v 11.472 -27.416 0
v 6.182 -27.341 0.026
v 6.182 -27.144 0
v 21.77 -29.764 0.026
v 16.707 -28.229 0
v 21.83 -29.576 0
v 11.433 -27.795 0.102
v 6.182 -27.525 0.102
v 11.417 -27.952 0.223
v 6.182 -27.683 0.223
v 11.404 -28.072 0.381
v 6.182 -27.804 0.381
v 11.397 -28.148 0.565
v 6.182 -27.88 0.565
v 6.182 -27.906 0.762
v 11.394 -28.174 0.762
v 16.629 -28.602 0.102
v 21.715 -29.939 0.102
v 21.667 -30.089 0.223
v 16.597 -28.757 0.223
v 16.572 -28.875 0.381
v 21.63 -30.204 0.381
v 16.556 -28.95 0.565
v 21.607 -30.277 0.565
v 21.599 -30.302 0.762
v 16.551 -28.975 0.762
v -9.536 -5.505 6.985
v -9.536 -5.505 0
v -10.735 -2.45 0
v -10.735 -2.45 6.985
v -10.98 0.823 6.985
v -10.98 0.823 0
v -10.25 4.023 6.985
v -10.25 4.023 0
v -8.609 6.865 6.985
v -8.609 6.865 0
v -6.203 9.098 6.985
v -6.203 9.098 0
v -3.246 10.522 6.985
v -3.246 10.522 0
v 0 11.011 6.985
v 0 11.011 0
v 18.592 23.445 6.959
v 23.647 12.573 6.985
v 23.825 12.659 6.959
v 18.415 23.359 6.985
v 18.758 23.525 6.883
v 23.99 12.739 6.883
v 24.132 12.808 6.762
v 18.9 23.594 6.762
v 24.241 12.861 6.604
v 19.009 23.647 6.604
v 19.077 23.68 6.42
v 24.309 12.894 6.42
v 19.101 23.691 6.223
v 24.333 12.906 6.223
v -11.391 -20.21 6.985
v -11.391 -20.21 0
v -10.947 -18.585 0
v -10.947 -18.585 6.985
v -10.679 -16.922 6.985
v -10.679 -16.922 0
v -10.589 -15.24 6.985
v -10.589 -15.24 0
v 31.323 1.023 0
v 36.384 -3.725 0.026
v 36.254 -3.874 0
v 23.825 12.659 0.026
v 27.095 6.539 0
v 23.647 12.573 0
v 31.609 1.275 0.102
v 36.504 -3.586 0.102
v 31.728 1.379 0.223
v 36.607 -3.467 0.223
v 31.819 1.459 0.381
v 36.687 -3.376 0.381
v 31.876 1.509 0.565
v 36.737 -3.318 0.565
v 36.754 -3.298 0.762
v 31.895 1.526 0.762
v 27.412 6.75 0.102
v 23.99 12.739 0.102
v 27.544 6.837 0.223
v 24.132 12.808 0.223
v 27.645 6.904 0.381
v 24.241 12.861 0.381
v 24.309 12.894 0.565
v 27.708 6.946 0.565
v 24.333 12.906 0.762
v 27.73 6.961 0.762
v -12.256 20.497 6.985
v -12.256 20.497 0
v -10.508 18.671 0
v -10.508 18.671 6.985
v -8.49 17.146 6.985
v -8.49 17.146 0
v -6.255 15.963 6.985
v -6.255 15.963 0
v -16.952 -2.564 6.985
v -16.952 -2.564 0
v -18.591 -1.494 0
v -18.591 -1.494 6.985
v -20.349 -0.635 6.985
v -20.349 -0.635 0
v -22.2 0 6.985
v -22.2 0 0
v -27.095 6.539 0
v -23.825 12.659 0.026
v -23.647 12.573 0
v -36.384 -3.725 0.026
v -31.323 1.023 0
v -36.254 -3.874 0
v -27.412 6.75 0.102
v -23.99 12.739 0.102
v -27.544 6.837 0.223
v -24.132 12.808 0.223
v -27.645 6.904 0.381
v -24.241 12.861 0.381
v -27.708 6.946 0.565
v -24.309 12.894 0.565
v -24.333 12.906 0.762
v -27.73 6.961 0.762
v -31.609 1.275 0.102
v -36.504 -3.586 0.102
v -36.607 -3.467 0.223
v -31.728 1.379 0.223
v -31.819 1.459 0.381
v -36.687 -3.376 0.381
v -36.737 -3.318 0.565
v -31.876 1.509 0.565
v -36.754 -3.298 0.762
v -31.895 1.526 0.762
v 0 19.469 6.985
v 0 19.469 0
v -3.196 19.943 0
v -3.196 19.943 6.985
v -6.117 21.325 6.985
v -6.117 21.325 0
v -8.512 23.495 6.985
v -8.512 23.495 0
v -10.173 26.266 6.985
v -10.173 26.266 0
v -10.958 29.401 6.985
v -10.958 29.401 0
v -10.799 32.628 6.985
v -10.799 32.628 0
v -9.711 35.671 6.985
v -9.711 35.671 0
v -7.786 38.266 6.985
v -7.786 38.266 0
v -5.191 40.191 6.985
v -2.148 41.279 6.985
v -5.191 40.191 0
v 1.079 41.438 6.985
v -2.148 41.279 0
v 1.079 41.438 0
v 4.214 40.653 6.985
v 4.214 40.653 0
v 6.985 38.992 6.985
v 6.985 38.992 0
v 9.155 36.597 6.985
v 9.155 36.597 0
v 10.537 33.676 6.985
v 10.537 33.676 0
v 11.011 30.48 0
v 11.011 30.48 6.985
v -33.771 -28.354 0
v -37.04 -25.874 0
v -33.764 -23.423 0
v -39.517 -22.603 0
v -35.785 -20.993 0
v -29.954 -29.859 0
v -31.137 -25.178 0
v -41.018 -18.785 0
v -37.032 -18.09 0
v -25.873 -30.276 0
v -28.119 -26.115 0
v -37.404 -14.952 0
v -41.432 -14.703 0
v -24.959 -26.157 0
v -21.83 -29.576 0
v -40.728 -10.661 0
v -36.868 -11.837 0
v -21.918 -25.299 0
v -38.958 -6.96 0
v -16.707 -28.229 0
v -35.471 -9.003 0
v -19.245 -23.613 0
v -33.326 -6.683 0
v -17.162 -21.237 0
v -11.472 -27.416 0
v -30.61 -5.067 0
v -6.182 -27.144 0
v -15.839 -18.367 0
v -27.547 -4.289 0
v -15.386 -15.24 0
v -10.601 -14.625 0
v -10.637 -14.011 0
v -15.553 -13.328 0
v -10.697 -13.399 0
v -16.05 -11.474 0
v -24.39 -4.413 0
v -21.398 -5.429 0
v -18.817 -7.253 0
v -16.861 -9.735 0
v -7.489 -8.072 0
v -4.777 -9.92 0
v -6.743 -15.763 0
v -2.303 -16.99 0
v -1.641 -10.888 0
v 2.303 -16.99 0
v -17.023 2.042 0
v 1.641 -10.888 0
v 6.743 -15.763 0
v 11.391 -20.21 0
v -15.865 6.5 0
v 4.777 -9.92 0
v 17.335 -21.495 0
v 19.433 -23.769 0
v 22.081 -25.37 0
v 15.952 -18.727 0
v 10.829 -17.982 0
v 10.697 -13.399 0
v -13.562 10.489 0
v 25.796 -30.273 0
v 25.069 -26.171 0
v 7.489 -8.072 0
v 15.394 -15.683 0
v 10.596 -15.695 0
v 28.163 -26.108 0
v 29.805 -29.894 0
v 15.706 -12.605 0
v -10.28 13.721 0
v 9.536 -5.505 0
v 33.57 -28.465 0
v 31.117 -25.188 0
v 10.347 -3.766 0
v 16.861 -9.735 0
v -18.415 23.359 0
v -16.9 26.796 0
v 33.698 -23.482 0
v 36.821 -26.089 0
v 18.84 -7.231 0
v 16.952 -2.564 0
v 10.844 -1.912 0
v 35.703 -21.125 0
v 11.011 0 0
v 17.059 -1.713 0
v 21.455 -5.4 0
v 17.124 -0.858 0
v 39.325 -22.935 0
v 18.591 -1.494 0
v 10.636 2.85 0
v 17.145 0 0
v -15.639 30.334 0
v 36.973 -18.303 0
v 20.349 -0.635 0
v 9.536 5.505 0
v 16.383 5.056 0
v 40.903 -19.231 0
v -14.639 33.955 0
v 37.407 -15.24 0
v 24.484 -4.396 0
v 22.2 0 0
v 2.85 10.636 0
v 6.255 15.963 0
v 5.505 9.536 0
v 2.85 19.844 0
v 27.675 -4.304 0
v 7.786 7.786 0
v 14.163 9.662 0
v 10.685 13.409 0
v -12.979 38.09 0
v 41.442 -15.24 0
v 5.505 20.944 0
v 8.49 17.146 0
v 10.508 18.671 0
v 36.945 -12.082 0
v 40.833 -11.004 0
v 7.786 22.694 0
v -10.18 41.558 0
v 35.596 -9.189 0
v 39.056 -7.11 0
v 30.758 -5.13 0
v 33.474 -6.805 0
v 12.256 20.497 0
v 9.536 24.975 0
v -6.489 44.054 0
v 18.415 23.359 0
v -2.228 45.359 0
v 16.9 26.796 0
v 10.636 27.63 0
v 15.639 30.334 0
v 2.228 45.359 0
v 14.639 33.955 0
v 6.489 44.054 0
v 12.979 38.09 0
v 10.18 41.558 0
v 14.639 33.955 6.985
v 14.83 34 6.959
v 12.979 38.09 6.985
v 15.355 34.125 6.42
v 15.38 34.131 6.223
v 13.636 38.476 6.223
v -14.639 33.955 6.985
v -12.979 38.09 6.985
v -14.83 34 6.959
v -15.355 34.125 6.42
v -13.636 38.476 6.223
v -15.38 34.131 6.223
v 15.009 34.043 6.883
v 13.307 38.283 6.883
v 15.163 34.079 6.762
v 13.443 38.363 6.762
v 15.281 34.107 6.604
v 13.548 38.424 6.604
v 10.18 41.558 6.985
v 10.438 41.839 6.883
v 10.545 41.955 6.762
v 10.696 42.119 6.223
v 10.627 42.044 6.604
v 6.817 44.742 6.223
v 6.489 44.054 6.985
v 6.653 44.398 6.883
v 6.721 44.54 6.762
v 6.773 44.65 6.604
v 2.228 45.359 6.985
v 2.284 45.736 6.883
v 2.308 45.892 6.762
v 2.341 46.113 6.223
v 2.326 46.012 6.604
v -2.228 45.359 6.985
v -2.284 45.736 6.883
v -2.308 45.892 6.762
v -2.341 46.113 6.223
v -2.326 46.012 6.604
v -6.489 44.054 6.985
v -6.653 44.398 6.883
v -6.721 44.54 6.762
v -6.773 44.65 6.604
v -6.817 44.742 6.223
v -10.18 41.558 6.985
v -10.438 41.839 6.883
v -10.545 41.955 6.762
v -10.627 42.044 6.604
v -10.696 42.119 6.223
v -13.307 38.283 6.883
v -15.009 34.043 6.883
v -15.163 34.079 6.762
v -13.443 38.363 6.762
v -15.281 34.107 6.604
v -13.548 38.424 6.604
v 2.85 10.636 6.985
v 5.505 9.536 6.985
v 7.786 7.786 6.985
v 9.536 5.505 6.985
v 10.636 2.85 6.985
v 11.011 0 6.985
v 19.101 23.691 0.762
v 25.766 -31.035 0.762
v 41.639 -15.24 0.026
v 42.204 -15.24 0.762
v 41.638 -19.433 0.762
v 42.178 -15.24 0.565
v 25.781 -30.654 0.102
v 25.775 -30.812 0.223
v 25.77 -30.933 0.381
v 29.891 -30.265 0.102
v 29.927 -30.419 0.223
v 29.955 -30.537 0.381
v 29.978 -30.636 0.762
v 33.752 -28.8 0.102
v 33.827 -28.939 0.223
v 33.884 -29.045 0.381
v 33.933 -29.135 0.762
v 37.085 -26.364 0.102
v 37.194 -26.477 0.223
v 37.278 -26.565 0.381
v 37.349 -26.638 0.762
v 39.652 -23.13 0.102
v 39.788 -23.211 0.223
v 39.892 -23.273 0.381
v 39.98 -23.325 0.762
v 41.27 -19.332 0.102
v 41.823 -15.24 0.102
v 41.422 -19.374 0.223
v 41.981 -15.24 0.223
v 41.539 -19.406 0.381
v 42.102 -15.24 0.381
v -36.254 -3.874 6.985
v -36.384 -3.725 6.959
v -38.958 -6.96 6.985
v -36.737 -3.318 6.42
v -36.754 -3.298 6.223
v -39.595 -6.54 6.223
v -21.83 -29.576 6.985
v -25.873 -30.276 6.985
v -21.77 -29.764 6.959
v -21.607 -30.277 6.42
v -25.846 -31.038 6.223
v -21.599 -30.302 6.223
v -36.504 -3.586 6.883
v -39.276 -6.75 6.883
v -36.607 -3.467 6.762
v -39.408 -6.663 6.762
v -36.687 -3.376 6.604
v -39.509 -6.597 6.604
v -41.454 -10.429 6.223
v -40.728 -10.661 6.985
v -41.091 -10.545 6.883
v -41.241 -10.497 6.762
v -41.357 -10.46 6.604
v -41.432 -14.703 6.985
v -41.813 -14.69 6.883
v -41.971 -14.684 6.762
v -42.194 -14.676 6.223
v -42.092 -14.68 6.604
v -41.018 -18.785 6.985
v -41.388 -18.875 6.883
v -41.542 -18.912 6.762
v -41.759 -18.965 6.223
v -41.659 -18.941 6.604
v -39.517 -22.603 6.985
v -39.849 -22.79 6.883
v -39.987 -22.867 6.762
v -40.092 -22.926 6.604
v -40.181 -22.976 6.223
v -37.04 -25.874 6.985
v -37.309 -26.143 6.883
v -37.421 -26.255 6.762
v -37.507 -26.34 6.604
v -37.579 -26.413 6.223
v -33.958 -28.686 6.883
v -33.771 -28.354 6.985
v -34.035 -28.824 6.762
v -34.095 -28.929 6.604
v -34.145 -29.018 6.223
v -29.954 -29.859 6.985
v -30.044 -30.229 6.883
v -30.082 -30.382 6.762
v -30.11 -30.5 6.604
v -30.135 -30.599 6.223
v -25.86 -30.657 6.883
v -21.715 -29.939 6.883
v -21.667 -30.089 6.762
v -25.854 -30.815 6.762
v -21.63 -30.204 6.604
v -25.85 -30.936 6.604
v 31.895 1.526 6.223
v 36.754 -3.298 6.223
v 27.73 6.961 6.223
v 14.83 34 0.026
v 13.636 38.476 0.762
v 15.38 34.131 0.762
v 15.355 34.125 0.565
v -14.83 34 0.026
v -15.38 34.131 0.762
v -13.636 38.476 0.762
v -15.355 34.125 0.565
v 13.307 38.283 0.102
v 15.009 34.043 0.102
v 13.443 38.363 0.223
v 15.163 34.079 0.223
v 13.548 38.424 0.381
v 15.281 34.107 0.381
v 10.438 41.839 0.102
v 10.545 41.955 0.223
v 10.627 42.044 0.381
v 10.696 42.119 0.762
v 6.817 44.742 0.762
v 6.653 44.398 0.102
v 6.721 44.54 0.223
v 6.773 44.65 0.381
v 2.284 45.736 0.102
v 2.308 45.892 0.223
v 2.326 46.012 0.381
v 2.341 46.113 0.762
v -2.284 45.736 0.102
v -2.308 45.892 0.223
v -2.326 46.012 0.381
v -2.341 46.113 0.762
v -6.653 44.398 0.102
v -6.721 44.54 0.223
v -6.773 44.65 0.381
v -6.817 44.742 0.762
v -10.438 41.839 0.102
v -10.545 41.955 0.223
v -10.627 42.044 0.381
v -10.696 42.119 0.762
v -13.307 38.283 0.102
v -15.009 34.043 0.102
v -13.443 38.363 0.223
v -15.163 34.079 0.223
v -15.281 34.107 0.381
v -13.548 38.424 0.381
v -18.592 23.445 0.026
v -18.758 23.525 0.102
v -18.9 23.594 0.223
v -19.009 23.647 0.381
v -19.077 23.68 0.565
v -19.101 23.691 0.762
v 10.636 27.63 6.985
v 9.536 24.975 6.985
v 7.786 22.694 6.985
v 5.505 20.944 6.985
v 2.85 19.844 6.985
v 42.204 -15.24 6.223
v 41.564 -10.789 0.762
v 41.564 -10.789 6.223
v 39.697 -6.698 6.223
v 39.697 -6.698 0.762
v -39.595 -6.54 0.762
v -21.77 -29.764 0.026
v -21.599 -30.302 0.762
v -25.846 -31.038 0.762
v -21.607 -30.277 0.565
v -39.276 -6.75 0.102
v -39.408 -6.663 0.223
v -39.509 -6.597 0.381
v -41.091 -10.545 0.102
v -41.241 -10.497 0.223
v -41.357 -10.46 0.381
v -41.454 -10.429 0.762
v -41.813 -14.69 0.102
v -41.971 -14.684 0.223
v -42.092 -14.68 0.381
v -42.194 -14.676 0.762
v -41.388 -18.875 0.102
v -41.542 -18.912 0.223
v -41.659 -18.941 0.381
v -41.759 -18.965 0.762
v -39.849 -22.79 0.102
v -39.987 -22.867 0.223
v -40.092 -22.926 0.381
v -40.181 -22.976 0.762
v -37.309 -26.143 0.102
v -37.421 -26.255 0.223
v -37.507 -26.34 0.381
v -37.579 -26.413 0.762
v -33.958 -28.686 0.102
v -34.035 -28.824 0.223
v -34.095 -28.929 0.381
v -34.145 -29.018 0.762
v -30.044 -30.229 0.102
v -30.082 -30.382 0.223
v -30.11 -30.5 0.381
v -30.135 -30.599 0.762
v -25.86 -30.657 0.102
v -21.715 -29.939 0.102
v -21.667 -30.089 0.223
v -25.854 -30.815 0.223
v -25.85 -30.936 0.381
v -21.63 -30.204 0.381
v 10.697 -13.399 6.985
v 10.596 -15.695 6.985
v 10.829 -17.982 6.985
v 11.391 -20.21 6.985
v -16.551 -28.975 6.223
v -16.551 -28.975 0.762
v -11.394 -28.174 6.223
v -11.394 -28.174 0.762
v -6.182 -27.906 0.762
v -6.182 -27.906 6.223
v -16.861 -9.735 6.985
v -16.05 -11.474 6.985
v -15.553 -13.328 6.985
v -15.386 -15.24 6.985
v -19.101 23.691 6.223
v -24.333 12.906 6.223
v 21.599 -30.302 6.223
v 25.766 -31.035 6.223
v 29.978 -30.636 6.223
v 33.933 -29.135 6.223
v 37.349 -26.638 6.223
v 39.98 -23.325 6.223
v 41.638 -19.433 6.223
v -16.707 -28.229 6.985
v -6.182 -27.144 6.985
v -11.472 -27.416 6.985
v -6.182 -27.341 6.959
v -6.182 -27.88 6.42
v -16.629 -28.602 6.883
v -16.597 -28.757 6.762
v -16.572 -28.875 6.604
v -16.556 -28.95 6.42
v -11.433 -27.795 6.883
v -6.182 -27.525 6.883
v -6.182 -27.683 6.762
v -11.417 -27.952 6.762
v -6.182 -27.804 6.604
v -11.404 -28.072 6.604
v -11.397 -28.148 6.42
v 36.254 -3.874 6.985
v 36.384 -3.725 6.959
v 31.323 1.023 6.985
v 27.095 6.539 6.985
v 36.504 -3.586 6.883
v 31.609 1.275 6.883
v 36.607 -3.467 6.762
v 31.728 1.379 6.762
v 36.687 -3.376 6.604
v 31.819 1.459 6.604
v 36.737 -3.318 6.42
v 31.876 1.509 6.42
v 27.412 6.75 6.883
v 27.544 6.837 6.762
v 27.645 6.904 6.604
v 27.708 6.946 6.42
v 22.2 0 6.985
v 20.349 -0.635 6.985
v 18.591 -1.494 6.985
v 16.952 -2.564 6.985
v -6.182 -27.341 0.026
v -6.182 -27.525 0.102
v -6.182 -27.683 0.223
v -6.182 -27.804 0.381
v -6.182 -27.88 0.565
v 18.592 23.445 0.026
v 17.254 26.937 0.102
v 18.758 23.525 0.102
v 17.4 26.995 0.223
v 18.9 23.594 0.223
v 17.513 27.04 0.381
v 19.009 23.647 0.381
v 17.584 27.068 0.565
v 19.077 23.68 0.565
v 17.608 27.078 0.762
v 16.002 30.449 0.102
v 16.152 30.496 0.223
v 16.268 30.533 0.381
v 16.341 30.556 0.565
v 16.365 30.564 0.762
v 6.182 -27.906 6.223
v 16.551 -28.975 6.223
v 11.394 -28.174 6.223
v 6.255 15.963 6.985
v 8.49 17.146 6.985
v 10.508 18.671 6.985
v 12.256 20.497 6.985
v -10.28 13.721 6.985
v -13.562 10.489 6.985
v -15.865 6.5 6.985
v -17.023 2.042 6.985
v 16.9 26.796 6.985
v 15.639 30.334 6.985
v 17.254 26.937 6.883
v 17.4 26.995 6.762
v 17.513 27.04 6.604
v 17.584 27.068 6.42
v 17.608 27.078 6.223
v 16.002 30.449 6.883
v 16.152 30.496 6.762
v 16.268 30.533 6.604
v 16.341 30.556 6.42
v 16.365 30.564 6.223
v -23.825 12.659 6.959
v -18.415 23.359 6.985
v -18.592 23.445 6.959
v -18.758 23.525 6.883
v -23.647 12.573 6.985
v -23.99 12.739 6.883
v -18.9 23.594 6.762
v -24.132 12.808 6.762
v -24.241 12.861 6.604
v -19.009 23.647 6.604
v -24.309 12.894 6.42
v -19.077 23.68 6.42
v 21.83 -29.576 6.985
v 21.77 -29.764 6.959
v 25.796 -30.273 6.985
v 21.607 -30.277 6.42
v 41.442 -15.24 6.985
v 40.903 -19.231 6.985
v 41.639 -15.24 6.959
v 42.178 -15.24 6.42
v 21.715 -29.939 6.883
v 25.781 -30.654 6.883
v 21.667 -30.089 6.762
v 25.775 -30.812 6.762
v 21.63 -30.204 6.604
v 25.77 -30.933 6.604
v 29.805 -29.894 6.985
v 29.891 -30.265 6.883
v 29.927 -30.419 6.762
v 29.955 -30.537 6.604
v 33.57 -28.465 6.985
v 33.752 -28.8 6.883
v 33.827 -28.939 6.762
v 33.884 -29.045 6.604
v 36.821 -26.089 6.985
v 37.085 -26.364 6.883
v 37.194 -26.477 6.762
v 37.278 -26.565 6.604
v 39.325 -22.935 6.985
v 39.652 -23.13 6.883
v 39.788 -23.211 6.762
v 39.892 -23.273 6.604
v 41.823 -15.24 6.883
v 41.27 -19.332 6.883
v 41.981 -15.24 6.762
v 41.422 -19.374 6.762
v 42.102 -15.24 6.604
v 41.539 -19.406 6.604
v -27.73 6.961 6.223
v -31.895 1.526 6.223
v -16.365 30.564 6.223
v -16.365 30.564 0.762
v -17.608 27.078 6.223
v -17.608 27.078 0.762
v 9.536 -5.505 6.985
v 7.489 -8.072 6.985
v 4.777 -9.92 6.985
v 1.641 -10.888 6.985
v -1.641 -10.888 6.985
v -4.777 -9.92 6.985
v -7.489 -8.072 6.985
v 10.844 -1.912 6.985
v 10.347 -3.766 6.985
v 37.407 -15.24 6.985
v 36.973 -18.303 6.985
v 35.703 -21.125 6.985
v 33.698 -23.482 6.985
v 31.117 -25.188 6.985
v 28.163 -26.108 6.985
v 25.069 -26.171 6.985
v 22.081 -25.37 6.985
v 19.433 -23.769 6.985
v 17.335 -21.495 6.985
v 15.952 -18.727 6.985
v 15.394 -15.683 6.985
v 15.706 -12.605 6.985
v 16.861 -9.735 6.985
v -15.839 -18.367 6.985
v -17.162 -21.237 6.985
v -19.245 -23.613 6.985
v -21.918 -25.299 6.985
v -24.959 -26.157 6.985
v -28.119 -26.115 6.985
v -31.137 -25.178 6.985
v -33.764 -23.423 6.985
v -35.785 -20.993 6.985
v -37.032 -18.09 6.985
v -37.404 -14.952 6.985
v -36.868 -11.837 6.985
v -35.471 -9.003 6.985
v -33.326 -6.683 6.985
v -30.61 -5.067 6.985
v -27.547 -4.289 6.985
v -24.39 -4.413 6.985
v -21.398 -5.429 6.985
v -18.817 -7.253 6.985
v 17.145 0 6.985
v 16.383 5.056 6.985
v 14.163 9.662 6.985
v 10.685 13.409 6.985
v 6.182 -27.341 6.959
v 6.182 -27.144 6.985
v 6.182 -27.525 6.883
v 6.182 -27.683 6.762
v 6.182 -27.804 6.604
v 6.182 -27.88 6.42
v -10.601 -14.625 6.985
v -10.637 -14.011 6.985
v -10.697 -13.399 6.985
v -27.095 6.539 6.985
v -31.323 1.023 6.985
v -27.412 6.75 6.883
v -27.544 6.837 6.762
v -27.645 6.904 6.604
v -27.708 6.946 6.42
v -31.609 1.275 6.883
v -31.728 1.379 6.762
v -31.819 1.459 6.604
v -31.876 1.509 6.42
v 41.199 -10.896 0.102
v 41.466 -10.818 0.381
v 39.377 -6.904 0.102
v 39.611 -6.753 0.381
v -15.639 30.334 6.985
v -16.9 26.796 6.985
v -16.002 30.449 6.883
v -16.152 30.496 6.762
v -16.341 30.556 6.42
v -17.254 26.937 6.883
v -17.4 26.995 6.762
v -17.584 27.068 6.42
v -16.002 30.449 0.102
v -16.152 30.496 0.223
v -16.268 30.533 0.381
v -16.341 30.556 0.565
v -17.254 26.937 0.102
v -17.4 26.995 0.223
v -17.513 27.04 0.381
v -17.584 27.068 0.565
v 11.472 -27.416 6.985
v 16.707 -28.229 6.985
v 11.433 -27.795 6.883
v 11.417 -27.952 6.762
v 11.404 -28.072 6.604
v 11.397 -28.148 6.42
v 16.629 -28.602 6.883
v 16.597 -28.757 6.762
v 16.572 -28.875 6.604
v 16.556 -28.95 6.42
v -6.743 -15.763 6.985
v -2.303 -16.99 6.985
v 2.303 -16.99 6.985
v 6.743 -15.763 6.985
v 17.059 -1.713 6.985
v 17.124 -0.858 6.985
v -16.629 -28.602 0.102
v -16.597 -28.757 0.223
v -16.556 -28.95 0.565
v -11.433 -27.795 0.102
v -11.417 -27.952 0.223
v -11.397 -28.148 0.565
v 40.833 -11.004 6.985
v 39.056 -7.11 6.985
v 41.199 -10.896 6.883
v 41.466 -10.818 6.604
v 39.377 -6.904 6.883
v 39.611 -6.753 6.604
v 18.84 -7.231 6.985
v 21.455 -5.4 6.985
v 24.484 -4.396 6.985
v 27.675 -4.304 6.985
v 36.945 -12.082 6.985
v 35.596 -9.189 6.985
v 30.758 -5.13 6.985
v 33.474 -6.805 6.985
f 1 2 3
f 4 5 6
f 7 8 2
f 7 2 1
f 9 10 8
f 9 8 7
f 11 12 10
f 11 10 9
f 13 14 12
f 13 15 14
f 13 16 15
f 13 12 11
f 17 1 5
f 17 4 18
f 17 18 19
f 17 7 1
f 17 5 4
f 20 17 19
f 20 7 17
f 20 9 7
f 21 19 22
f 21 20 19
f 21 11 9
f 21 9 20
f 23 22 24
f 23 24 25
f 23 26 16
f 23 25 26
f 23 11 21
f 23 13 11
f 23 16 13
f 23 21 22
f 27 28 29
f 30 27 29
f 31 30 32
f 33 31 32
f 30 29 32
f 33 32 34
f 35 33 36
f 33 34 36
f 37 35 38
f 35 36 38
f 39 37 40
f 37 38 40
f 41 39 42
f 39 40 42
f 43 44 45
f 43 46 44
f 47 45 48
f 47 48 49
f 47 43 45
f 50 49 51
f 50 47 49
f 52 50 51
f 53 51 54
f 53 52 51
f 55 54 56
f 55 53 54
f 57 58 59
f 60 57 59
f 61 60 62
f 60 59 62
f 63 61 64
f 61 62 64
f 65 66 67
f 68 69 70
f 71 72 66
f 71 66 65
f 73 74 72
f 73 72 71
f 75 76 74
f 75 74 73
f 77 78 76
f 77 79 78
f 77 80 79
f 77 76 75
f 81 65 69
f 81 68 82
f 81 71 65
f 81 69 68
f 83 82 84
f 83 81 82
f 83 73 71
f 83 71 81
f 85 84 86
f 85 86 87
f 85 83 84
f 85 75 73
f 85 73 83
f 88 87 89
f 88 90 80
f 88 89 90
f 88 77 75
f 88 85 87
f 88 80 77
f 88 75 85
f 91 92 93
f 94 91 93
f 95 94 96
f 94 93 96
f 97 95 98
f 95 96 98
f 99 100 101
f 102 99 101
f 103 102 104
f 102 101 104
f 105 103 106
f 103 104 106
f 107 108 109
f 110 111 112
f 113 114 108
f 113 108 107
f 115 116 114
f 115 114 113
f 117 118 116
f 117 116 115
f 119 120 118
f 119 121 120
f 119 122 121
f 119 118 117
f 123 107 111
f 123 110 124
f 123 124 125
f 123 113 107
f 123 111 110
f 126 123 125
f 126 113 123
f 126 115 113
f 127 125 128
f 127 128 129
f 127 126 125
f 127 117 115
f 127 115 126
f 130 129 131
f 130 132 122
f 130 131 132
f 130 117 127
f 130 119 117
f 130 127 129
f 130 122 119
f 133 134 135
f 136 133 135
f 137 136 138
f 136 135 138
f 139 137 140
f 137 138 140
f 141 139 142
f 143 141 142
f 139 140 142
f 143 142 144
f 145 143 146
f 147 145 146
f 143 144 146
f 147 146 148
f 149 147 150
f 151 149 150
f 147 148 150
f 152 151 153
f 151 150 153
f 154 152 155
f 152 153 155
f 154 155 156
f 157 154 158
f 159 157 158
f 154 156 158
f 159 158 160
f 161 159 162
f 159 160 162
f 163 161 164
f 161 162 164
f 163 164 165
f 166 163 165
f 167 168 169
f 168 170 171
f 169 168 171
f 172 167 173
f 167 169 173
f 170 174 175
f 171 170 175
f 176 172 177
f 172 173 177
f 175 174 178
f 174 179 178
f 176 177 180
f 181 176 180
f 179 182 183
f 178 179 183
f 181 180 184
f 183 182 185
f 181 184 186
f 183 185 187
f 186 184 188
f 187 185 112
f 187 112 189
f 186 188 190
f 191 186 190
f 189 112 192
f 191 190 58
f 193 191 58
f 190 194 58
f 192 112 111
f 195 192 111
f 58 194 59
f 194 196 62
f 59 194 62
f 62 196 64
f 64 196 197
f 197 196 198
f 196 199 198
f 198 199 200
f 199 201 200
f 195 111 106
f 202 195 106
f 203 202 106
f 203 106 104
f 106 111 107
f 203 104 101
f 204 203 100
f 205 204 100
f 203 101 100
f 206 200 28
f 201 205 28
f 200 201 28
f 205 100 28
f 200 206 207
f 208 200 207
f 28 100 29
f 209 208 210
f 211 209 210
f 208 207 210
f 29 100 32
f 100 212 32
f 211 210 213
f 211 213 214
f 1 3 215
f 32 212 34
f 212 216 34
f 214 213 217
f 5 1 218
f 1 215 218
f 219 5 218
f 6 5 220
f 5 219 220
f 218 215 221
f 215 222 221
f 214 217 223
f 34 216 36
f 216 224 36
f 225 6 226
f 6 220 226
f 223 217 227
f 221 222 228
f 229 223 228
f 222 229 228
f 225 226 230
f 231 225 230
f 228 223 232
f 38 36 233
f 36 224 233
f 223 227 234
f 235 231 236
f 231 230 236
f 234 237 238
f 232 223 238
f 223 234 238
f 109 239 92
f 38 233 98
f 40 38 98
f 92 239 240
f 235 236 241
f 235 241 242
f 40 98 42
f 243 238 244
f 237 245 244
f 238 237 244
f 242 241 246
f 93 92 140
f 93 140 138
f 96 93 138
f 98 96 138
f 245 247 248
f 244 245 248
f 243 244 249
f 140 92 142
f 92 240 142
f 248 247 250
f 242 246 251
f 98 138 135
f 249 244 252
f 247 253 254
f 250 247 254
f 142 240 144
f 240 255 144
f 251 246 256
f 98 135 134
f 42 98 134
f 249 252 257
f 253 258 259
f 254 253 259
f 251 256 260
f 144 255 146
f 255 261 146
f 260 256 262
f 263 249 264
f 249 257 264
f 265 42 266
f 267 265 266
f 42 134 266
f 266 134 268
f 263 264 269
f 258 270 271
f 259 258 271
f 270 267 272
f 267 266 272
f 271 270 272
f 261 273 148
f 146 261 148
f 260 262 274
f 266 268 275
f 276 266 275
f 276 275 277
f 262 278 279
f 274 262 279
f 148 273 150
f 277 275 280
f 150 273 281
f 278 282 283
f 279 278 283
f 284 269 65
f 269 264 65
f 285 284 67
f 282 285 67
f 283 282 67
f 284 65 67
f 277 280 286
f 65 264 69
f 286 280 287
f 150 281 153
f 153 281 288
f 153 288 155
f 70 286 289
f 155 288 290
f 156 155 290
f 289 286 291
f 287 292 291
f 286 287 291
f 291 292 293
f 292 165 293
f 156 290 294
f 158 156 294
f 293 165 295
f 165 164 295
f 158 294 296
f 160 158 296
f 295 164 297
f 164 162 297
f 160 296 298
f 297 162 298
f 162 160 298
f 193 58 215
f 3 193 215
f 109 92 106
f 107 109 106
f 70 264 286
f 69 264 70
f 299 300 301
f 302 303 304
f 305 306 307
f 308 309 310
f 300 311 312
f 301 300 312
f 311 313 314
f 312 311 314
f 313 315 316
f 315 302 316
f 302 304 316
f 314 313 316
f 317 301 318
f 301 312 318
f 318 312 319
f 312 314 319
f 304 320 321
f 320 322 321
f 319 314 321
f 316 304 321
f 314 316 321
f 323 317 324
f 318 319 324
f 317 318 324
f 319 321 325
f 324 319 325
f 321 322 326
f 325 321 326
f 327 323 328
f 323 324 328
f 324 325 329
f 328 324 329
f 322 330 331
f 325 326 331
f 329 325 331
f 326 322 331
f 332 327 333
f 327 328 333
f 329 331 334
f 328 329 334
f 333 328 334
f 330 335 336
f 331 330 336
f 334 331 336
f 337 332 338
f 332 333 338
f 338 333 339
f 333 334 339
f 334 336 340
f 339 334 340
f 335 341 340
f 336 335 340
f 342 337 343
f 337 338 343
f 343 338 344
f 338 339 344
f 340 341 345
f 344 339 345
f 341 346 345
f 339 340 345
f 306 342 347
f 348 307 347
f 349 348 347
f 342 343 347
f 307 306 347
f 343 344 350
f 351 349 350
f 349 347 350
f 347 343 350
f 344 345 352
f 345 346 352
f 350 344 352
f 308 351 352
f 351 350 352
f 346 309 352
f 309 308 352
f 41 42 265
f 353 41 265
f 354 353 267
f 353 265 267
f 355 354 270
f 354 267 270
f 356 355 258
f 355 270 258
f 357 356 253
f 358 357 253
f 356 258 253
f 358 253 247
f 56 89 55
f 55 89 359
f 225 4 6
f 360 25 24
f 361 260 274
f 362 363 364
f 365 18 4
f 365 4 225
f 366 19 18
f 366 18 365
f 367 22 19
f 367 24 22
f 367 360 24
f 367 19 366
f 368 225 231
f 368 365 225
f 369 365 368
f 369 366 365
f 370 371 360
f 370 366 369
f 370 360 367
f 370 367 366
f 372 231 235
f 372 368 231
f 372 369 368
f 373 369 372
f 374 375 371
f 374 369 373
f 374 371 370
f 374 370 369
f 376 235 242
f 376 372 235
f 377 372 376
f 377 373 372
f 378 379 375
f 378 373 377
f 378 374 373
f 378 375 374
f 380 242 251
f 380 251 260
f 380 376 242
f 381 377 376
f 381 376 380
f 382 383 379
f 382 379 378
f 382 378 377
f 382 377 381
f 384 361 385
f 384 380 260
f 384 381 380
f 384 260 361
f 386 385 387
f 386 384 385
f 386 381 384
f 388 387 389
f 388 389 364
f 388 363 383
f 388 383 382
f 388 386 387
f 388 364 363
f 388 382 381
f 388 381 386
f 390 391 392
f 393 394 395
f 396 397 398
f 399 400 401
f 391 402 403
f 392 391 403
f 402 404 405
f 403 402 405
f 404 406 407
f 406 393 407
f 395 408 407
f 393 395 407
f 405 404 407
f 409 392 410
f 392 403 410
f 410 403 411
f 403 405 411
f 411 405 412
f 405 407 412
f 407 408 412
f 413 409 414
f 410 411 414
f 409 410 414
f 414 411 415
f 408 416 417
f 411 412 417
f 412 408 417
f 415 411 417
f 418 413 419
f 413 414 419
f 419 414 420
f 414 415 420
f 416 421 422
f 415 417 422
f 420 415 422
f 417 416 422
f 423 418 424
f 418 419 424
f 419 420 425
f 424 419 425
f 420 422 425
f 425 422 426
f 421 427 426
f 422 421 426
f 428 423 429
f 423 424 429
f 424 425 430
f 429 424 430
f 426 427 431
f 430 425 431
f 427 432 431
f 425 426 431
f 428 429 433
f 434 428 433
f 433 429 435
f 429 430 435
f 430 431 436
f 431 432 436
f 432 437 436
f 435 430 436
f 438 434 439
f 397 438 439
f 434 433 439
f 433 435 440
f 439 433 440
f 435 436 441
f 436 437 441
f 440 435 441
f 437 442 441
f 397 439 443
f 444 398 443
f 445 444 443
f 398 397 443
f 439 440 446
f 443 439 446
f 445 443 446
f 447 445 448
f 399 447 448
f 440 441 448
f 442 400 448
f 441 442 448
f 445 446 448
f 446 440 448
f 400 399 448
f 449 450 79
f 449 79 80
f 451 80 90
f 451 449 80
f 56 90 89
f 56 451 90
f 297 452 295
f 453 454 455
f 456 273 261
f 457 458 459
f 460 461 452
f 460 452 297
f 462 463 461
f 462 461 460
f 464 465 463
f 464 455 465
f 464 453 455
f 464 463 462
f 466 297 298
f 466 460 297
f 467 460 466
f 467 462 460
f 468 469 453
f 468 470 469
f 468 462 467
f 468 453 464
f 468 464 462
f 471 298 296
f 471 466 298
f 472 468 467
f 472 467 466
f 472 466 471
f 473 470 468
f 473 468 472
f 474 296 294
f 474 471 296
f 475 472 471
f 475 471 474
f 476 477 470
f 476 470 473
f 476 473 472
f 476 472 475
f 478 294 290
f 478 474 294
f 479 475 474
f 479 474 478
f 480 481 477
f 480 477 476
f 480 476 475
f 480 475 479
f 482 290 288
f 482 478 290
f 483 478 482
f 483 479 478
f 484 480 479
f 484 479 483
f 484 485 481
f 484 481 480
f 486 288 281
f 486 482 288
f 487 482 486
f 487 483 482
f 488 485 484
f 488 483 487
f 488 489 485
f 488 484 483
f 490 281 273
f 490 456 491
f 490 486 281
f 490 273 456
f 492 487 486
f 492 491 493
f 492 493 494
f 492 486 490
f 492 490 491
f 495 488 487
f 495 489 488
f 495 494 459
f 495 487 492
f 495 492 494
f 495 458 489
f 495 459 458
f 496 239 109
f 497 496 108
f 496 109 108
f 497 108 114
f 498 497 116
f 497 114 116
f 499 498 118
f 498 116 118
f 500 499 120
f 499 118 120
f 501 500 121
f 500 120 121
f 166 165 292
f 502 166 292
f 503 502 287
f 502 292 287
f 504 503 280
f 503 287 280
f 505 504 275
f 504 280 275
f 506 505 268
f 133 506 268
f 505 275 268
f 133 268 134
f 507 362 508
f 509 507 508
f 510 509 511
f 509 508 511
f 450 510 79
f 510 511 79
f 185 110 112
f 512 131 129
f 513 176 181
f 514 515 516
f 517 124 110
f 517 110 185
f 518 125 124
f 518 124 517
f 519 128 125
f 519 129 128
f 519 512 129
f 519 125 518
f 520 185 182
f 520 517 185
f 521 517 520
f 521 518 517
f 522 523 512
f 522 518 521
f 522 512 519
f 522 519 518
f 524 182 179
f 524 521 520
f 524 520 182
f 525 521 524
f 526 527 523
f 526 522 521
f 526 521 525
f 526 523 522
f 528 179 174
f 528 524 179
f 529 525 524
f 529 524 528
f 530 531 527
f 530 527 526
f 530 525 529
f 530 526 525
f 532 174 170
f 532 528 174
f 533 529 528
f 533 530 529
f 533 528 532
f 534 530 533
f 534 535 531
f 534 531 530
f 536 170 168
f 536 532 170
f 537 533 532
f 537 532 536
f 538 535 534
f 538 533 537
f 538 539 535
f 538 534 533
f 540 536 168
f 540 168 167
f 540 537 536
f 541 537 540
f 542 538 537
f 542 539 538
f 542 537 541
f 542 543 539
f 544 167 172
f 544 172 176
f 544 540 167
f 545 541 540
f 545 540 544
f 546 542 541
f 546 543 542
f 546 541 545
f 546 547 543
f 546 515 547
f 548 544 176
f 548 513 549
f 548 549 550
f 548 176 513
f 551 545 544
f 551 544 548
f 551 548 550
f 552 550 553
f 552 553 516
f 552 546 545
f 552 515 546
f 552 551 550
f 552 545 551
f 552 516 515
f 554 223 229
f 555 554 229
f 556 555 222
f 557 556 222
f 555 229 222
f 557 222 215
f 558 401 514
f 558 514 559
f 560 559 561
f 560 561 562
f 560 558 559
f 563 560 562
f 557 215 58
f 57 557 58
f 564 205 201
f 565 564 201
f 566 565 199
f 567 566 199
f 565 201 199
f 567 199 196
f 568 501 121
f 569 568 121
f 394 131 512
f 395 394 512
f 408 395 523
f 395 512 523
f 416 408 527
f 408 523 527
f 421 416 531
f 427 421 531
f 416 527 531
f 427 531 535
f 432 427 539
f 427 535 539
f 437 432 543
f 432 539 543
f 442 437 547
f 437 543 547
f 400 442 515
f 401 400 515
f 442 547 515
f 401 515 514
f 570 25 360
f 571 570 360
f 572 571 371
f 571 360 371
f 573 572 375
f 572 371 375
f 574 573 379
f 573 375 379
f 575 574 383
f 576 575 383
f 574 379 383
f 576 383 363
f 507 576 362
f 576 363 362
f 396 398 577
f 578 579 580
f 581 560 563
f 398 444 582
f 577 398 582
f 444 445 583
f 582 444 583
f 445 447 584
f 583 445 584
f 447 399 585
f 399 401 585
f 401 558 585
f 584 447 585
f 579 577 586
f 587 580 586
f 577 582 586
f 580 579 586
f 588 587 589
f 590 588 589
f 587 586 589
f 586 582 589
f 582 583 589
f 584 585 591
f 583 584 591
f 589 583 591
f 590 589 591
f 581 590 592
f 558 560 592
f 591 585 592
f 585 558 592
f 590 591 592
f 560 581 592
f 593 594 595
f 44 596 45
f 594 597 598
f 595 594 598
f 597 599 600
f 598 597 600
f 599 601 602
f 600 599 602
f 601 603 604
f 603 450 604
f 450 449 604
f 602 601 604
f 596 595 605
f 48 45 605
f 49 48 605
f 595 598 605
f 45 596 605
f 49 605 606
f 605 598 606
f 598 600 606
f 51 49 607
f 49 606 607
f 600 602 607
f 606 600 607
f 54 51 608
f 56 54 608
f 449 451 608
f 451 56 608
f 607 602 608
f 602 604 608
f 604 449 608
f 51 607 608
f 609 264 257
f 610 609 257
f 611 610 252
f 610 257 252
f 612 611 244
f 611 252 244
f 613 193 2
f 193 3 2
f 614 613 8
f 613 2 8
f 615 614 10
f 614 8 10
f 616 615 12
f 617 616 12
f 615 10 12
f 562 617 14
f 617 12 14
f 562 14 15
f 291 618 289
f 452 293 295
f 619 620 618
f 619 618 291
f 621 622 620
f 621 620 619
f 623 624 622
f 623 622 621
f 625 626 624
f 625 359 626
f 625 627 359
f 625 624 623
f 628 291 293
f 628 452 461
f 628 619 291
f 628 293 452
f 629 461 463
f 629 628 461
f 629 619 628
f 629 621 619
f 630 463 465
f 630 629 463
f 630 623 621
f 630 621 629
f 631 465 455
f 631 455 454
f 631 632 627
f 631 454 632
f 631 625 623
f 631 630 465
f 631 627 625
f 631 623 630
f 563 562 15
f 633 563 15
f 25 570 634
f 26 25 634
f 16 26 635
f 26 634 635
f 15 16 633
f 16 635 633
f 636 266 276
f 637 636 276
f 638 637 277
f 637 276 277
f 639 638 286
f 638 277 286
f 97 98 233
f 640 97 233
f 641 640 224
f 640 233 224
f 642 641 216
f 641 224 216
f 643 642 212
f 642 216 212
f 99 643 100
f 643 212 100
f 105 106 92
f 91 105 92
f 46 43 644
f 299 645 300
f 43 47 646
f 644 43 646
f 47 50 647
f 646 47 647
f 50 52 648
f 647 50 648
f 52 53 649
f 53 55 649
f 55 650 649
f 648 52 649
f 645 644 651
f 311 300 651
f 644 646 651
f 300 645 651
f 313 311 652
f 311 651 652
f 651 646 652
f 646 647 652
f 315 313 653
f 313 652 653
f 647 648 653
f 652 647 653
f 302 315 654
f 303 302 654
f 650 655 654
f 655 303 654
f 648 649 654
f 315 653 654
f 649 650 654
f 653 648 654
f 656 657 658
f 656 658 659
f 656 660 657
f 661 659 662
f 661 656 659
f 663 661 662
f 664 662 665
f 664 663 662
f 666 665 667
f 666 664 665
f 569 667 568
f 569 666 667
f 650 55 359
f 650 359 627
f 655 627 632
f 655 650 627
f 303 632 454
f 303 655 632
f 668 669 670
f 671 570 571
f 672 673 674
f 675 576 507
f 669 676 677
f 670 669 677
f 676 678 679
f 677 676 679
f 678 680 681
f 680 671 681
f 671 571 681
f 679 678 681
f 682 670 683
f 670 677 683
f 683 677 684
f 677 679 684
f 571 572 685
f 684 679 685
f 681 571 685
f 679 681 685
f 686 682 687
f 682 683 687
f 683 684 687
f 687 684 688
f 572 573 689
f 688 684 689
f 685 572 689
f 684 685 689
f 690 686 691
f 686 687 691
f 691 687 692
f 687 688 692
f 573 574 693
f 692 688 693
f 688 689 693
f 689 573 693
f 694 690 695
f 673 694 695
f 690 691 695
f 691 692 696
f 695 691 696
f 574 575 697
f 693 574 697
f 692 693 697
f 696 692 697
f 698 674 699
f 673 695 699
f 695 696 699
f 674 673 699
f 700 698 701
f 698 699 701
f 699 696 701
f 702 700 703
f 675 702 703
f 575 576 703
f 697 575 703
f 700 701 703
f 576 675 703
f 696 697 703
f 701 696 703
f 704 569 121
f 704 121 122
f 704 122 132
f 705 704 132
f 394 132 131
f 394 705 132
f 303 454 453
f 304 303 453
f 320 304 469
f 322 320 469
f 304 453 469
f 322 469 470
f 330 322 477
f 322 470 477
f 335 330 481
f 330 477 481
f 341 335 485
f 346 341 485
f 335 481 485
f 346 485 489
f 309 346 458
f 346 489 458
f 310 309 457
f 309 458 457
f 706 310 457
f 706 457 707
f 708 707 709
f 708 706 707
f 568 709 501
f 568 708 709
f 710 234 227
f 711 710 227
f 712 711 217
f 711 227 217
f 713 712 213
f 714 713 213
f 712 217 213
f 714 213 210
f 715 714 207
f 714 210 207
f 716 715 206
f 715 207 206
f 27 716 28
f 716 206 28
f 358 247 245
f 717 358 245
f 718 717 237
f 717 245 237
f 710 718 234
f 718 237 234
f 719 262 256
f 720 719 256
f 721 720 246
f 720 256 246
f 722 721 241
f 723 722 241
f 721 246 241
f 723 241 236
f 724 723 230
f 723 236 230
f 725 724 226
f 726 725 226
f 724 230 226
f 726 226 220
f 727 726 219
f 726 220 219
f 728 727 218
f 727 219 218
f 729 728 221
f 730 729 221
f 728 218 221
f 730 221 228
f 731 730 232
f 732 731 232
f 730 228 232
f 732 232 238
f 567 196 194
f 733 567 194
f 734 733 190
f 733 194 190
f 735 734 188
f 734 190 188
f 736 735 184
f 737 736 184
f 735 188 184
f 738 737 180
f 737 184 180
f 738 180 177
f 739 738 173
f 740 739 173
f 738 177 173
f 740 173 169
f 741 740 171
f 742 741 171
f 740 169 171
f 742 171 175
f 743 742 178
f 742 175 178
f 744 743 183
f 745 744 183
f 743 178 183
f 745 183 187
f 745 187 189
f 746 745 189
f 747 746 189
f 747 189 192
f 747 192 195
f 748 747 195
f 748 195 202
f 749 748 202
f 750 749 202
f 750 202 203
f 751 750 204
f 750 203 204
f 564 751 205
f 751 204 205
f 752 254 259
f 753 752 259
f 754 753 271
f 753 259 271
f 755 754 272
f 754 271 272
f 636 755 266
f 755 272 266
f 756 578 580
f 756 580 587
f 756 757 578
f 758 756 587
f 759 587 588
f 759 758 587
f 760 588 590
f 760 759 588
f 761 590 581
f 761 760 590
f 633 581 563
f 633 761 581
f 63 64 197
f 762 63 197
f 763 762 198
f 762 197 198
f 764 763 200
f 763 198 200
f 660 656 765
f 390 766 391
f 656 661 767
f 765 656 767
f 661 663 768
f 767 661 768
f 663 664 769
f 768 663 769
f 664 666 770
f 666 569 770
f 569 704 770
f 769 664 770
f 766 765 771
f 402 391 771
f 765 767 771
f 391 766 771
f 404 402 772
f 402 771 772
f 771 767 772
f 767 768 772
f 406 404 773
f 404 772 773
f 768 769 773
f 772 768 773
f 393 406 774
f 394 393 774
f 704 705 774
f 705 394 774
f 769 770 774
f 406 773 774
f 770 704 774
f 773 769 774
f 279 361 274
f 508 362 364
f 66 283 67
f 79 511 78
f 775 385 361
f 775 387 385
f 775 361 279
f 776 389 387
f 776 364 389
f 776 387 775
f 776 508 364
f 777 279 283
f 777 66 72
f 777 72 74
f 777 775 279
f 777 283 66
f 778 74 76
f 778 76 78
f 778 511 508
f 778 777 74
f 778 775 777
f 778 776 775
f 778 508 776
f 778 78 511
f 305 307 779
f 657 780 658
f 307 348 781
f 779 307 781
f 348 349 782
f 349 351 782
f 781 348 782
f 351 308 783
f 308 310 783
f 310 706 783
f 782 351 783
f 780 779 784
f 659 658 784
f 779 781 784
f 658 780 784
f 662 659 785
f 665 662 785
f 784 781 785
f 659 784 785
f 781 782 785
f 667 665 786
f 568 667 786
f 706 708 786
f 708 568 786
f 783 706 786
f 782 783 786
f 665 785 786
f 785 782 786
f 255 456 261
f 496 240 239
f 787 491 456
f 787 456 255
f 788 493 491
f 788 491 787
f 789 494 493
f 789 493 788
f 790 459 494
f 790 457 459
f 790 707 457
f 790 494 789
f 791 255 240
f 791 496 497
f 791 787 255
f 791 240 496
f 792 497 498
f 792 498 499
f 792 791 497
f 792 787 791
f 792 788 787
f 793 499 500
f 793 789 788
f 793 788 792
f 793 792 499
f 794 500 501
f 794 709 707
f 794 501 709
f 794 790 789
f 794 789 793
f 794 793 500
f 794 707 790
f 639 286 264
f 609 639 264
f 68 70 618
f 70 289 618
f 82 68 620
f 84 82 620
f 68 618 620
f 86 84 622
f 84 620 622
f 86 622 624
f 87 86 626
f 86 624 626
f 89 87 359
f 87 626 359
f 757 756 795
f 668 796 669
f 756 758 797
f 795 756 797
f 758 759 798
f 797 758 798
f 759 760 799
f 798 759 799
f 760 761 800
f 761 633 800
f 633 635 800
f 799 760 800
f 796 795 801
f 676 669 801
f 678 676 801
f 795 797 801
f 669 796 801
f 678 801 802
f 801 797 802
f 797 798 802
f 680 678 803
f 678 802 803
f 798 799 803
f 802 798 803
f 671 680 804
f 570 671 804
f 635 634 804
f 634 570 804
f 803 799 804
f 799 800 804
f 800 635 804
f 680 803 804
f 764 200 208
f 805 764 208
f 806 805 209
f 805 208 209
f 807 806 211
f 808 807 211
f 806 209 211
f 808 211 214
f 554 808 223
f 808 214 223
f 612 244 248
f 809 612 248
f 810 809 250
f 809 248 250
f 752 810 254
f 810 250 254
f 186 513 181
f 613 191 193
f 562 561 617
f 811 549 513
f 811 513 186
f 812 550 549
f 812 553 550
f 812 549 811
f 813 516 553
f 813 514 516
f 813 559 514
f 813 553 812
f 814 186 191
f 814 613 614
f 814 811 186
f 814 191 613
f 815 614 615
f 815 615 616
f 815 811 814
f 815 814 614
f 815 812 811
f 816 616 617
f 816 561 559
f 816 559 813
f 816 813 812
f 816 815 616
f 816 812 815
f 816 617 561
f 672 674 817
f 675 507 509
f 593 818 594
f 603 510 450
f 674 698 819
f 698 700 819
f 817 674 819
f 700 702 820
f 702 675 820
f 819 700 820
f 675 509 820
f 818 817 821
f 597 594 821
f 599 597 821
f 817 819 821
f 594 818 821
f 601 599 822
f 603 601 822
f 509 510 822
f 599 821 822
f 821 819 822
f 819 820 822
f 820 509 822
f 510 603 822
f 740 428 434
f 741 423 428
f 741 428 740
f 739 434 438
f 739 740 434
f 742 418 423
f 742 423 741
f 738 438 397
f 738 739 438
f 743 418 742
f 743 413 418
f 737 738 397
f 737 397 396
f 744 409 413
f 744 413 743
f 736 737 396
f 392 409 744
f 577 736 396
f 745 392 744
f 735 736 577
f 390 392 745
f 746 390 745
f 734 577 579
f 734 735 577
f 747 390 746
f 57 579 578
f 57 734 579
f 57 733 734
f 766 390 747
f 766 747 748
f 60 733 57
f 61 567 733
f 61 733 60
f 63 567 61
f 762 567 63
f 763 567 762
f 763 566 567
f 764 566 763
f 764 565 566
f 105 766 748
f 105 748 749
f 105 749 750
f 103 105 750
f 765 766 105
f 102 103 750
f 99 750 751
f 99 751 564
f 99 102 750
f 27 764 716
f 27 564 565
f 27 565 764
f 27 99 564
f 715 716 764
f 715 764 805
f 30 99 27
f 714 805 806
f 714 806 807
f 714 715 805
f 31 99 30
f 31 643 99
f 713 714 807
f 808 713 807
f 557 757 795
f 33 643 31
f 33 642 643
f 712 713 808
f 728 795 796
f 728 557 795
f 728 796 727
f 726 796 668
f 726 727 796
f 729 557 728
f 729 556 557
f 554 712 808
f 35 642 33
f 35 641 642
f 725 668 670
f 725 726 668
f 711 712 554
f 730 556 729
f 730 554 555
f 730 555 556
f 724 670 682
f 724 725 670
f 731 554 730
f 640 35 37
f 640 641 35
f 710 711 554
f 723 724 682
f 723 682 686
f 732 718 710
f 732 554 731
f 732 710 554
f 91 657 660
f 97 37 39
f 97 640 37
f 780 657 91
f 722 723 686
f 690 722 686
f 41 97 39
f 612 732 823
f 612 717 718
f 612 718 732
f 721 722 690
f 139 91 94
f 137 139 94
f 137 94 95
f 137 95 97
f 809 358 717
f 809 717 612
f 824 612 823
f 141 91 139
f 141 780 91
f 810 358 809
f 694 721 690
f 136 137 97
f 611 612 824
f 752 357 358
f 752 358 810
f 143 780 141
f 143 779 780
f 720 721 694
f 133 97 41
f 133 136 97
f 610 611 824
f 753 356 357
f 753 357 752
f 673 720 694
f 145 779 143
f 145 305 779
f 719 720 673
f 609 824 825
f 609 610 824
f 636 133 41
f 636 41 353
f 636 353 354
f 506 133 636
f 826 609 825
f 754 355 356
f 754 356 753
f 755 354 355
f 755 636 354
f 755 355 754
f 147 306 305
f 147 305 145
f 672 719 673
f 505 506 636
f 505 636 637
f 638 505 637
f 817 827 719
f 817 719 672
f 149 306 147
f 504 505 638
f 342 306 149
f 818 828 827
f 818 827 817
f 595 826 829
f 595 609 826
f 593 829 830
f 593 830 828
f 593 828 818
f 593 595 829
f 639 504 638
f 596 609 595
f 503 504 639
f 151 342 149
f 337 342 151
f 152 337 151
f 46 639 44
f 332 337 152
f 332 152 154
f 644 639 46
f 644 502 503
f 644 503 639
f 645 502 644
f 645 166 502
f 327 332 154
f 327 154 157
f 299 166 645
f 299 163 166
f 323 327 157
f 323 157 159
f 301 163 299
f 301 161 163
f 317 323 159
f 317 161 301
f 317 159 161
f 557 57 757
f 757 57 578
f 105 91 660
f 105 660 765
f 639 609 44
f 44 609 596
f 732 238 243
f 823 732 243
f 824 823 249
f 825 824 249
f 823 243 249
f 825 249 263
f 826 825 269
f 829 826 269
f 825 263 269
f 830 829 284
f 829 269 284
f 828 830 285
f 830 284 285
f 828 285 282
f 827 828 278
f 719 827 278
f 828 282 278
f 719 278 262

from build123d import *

# Parameters (mm, degrees)
F1_DEPTH = 6.985
F2_R     = 50.8
F3_R     = 0.762
F4_R     = 0.762


with BuildPart() as f1:
    # F0 (on Top) → F1 (new body)
    with BuildSketch(Plane.XY):
        with BuildLine():
            ThreePointArc((-6.2554756572, 15.9630839534), (-3.1830763908, 16.8469299782), (0, 17.145))
            ThreePointArc((0, 17.145), (3.1830763908, 16.8469299782), (6.2554756572, 15.9630839534))
            ThreePointArc((6.2554756572, 15.9630839534), (9.5294349524, 17.8680335914), (12.2562140059, 20.4971624553))
            ThreePointArc((12.2562140059, 20.4971624553), (14.8931175874, 25.1821819838), (15.8073346015, 30.48))
            ThreePointArc((15.8073346015, 30.48), (0, 46.2873346015), (-15.8073346015, 30.48))
            ThreePointArc((-15.8073346015, 30.48), (-14.8931175874, 25.1821819838), (-12.2562140059, 20.4971624553))
            ThreePointArc((-12.2562140059, 20.4971624553), (-9.5294349524, 17.8680335914), (-6.2554756572, 15.9630839534))
        make_face()
        with BuildLine():
            ThreePointArc((11.0109, 30.48), (7.785882057, 22.694117943), (0, 19.4691))
            ThreePointArc((0, 19.4691), (-7.785882057, 38.265882057), (11.0109, 30.48))
        make_face(mode=Mode.SUBTRACT)
        with BuildLine():
            ThreePointArc((16.952174055, -2.5641411448), (16.1814075323, -5.6668399724), (14.8480055479, -8.5725))
            ThreePointArc((14.8480055479, -8.5725), (12.9983311415, -11.1800900057), (10.6966983977, -13.3989428086))
            ThreePointArc((10.6966983977, -13.3989428086), (10.6705675574, -16.8425957477), (11.3908194918, -20.2101862123))
            ThreePointArc((11.3908194918, -20.2101862123), (13.5737626184, -24.4839388278), (16.9385483902, -27.9056955145))
            ThreePointArc((16.9385483902, -27.9056955145), (33.4805048345, -29.3711024104), (42.2037889088, -15.24))
            ThreePointArc((42.2037889088, -15.24), (38.9705171928, -5.6606070257), (30.5933849958, 0))
            ThreePointArc((30.5933849958, 0), (26.3964543073, 0.5673346015), (22.1995236189, 0))
            ThreePointArc((22.1995236189, 0), (19.456399269, -1.0376247315), (16.952174055, -2.5641411448))
        make_face()
        with BuildLine():
            ThreePointArc((37.4073543073, -15.24), (23.5466236836, -25.8757126807), (16.8607351888, -9.73455))
            ThreePointArc((16.8607351888, -9.73455), (29.2462849311, -4.6042873193), (37.4073543073, -15.24))
        make_face(mode=Mode.SUBTRACT)
        with BuildLine():
            ThreePointArc((-10.6966983977, -13.3989428086), (-12.9983311415, -11.1800900057), (-14.8480055479, -8.5725))
            ThreePointArc((-14.8480055479, -8.5725), (-16.1814075323, -5.6668399724), (-16.952174055, -2.5641411448))
            ThreePointArc((-16.952174055, -2.5641411448), (-19.456399269, -1.0376247315), (-22.1995236189, 0))
            ThreePointArc((-22.1995236189, 0), (-26.3964543073, 0.5673346015), (-30.5933849958, 0))
            ThreePointArc((-30.5933849958, 0), (-40.5950959898, -22.1876903772), (-16.9385483902, -27.9056955145))
            ThreePointArc((-16.9385483902, -27.9056955145), (-13.5737626184, -24.4839388278), (-11.3908194918, -20.2101862123))
            ThreePointArc((-11.3908194918, -20.2101862123), (-10.7908316405, -17.7572144094), (-10.5891197059, -15.24))
            ThreePointArc((-10.5891197059, -15.24), (-10.6160372972, -14.3179012042), (-10.6966983977, -13.3989428086))
        make_face()
        with BuildLine():
            ThreePointArc((-15.3855543073, -15.24), (-37.032166988, -18.0898306237), (-16.8607351888, -9.73455))
            ThreePointArc((-16.8607351888, -9.73455), (-15.7607416267, -12.3901693763), (-15.3855543073, -15.24))
        make_face(mode=Mode.SUBTRACT)
        with BuildLine():
            Line((-22.1995236189, 0), (-12.2562140059, 20.4971624553))
            ThreePointArc((-12.2562140059, 20.4971624553), (-14.8931175874, 25.1821819838), (-15.8073346015, 30.48))
            Line((-15.8073346015, 30.48), (-30.5933849958, 0))
            ThreePointArc((-30.5933849958, 0), (-26.3964543073, 0.5673346015), (-22.1995236189, 0))
        make_face()
        with BuildLine():
            ThreePointArc((15.8073346015, 30.48), (14.8931175874, 25.1821819838), (12.2562140059, 20.4971624553))
            Line((12.2562140059, 20.4971624553), (22.1995236189, 0))
            ThreePointArc((22.1995236189, 0), (26.3964543073, 0.5673346015), (30.5933849958, 0))
            Line((30.5933849958, 0), (15.8073346015, 30.48))
        make_face()
        with BuildLine():
            ThreePointArc((16.9385483902, -27.9056955145), (13.5737626184, -24.4839388278), (11.3908194918, -20.2101862123))
            Line((11.3908194918, -20.2101862123), (-11.3908194918, -20.2101862123))
            ThreePointArc((-11.3908194918, -20.2101862123), (-13.5737626184, -24.4839388278), (-16.9385483902, -27.9056955145))
            Line((-16.9385483902, -27.9056955145), (16.9385483902, -27.9056955145))
        make_face()
        with BuildLine():
            ThreePointArc((0, 11.0109), (7.785882057, 7.785882057), (11.0109, 0))
            ThreePointArc((11.0109, 0), (10.6357126807, -2.8498306237), (9.5357191185, -5.50545))
            Line((9.5357191185, -5.50545), (12.7069009763, -7.3363326993))
            ThreePointArc((12.7069009763, -7.3363326993), (14.5859921181, -4.7335824336), (16.952174055, -2.5641411448))
            ThreePointArc((16.952174055, -2.5641411448), (17.0967255516, -1.2856906369), (17.145, 0))
            ThreePointArc((17.145, 0), (14.1633533307, 9.6618035288), (6.2554756572, 15.9630839534))
            ThreePointArc((6.2554756572, 15.9630839534), (3.1935934206, 14.9986309305), (0, 14.6726653985))
            Line((0, 14.6726653985), (0, 11.0109))
        make_face()
        with BuildLine():
            Line((12.7069009763, -7.3363326993), (9.5357191185, -5.50545))
            ThreePointArc((9.5357191185, -5.50545), (0, -11.0109), (-9.5357191185, -5.50545))
            Line((-9.5357191185, -5.50545), (-12.7069009763, -7.3363326993))
            ThreePointArc((-12.7069009763, -7.3363326993), (-11.3923986975, -10.2650484968), (-10.6966983977, -13.3989428086))
            ThreePointArc((-10.6966983977, -13.3989428086), (0, -17.145), (10.6966983977, -13.3989428086))
            ThreePointArc((10.6966983977, -13.3989428086), (11.3923986975, -10.2650484968), (12.7069009763, -7.3363326993))
        make_face()
        with BuildLine():
            ThreePointArc((-9.5357191185, -5.50545), (-9.5357191185, 5.50545), (0, 11.0109))
            Line((0, 11.0109), (0, 14.6726653985))
            ThreePointArc((0, 14.6726653985), (-3.1935934206, 14.9986309305), (-6.2554756572, 15.9630839534))
            ThreePointArc((-6.2554756572, 15.9630839534), (-14.8480055479, 8.5725), (-16.952174055, -2.5641411448))
            ThreePointArc((-16.952174055, -2.5641411448), (-14.5859921181, -4.7335824336), (-12.7069009763, -7.3363326993))
            Line((-12.7069009763, -7.3363326993), (-9.5357191185, -5.50545))
        make_face()
        with BuildLine():
            Line((14.8480055479, -8.5725), (12.7069009763, -7.3363326993))
            ThreePointArc((12.7069009763, -7.3363326993), (11.3923986975, -10.2650484968), (10.6966983977, -13.3989428086))
            ThreePointArc((10.6966983977, -13.3989428086), (12.9983311415, -11.1800900057), (14.8480055479, -8.5725))
        make_face()
        with BuildLine():
            ThreePointArc((16.952174055, -2.5641411448), (14.5859921181, -4.7335824336), (12.7069009763, -7.3363326993))
            Line((12.7069009763, -7.3363326993), (14.8480055479, -8.5725))
            ThreePointArc((14.8480055479, -8.5725), (16.1814075323, -5.6668399724), (16.952174055, -2.5641411448))
        make_face()
        with BuildLine():
            Line((0, 17.145), (0, 14.6726653985))
            ThreePointArc((0, 14.6726653985), (3.1935934206, 14.9986309305), (6.2554756572, 15.9630839534))
            ThreePointArc((6.2554756572, 15.9630839534), (3.1830763908, 16.8469299782), (0, 17.145))
        make_face()
        with BuildLine():
            ThreePointArc((-6.2554756572, 15.9630839534), (-3.1935934206, 14.9986309305), (0, 14.6726653985))
            Line((0, 14.6726653985), (0, 17.145))
            ThreePointArc((0, 17.145), (-3.1830763908, 16.8469299782), (-6.2554756572, 15.9630839534))
        make_face()
        with BuildLine():
            Line((-14.8480055479, -8.5725), (-12.7069009763, -7.3363326993))
            ThreePointArc((-12.7069009763, -7.3363326993), (-14.5859921181, -4.7335824336), (-16.952174055, -2.5641411448))
            ThreePointArc((-16.952174055, -2.5641411448), (-16.1814075323, -5.6668399724), (-14.8480055479, -8.5725))
        make_face()
        with BuildLine():
            ThreePointArc((-10.6966983977, -13.3989428086), (-11.3923986975, -10.2650484968), (-12.7069009763, -7.3363326993))
            Line((-12.7069009763, -7.3363326993), (-14.8480055479, -8.5725))
            ThreePointArc((-14.8480055479, -8.5725), (-12.9983311415, -11.1800900057), (-10.6966983977, -13.3989428086))
        make_face()
    extrude(amount=F1_DEPTH)

    # F2
    f2_edges = [f1.edges().sort_by_distance(p)[0] for p in [
        (16.938548, -27.905696, 3.4925),
        (-16.938548, -27.905696, 3.4925),
        (15.807335, 30.48, 3.4925),
        (30.593385, 0, 3.4925),
        (-15.807335, 30.48, 3.4925),
        (-30.593385, 0, 3.4925),
    ]]
    fillet(f2_edges, radius=F2_R)

    # F3
    f3_edges = [f1.edges().sort_by_distance(p)[0] for p in [
        (0, -27.905696, 0),
    ]]
    fillet(f3_edges, radius=F3_R)

    # F4
    f4_edges = [f1.edges().sort_by_distance(p)[0] for p in [
        (-21.716674, 18.298473, 6.985),
    ]]
    fillet(f4_edges, radius=F4_R)


solid = f1.part
